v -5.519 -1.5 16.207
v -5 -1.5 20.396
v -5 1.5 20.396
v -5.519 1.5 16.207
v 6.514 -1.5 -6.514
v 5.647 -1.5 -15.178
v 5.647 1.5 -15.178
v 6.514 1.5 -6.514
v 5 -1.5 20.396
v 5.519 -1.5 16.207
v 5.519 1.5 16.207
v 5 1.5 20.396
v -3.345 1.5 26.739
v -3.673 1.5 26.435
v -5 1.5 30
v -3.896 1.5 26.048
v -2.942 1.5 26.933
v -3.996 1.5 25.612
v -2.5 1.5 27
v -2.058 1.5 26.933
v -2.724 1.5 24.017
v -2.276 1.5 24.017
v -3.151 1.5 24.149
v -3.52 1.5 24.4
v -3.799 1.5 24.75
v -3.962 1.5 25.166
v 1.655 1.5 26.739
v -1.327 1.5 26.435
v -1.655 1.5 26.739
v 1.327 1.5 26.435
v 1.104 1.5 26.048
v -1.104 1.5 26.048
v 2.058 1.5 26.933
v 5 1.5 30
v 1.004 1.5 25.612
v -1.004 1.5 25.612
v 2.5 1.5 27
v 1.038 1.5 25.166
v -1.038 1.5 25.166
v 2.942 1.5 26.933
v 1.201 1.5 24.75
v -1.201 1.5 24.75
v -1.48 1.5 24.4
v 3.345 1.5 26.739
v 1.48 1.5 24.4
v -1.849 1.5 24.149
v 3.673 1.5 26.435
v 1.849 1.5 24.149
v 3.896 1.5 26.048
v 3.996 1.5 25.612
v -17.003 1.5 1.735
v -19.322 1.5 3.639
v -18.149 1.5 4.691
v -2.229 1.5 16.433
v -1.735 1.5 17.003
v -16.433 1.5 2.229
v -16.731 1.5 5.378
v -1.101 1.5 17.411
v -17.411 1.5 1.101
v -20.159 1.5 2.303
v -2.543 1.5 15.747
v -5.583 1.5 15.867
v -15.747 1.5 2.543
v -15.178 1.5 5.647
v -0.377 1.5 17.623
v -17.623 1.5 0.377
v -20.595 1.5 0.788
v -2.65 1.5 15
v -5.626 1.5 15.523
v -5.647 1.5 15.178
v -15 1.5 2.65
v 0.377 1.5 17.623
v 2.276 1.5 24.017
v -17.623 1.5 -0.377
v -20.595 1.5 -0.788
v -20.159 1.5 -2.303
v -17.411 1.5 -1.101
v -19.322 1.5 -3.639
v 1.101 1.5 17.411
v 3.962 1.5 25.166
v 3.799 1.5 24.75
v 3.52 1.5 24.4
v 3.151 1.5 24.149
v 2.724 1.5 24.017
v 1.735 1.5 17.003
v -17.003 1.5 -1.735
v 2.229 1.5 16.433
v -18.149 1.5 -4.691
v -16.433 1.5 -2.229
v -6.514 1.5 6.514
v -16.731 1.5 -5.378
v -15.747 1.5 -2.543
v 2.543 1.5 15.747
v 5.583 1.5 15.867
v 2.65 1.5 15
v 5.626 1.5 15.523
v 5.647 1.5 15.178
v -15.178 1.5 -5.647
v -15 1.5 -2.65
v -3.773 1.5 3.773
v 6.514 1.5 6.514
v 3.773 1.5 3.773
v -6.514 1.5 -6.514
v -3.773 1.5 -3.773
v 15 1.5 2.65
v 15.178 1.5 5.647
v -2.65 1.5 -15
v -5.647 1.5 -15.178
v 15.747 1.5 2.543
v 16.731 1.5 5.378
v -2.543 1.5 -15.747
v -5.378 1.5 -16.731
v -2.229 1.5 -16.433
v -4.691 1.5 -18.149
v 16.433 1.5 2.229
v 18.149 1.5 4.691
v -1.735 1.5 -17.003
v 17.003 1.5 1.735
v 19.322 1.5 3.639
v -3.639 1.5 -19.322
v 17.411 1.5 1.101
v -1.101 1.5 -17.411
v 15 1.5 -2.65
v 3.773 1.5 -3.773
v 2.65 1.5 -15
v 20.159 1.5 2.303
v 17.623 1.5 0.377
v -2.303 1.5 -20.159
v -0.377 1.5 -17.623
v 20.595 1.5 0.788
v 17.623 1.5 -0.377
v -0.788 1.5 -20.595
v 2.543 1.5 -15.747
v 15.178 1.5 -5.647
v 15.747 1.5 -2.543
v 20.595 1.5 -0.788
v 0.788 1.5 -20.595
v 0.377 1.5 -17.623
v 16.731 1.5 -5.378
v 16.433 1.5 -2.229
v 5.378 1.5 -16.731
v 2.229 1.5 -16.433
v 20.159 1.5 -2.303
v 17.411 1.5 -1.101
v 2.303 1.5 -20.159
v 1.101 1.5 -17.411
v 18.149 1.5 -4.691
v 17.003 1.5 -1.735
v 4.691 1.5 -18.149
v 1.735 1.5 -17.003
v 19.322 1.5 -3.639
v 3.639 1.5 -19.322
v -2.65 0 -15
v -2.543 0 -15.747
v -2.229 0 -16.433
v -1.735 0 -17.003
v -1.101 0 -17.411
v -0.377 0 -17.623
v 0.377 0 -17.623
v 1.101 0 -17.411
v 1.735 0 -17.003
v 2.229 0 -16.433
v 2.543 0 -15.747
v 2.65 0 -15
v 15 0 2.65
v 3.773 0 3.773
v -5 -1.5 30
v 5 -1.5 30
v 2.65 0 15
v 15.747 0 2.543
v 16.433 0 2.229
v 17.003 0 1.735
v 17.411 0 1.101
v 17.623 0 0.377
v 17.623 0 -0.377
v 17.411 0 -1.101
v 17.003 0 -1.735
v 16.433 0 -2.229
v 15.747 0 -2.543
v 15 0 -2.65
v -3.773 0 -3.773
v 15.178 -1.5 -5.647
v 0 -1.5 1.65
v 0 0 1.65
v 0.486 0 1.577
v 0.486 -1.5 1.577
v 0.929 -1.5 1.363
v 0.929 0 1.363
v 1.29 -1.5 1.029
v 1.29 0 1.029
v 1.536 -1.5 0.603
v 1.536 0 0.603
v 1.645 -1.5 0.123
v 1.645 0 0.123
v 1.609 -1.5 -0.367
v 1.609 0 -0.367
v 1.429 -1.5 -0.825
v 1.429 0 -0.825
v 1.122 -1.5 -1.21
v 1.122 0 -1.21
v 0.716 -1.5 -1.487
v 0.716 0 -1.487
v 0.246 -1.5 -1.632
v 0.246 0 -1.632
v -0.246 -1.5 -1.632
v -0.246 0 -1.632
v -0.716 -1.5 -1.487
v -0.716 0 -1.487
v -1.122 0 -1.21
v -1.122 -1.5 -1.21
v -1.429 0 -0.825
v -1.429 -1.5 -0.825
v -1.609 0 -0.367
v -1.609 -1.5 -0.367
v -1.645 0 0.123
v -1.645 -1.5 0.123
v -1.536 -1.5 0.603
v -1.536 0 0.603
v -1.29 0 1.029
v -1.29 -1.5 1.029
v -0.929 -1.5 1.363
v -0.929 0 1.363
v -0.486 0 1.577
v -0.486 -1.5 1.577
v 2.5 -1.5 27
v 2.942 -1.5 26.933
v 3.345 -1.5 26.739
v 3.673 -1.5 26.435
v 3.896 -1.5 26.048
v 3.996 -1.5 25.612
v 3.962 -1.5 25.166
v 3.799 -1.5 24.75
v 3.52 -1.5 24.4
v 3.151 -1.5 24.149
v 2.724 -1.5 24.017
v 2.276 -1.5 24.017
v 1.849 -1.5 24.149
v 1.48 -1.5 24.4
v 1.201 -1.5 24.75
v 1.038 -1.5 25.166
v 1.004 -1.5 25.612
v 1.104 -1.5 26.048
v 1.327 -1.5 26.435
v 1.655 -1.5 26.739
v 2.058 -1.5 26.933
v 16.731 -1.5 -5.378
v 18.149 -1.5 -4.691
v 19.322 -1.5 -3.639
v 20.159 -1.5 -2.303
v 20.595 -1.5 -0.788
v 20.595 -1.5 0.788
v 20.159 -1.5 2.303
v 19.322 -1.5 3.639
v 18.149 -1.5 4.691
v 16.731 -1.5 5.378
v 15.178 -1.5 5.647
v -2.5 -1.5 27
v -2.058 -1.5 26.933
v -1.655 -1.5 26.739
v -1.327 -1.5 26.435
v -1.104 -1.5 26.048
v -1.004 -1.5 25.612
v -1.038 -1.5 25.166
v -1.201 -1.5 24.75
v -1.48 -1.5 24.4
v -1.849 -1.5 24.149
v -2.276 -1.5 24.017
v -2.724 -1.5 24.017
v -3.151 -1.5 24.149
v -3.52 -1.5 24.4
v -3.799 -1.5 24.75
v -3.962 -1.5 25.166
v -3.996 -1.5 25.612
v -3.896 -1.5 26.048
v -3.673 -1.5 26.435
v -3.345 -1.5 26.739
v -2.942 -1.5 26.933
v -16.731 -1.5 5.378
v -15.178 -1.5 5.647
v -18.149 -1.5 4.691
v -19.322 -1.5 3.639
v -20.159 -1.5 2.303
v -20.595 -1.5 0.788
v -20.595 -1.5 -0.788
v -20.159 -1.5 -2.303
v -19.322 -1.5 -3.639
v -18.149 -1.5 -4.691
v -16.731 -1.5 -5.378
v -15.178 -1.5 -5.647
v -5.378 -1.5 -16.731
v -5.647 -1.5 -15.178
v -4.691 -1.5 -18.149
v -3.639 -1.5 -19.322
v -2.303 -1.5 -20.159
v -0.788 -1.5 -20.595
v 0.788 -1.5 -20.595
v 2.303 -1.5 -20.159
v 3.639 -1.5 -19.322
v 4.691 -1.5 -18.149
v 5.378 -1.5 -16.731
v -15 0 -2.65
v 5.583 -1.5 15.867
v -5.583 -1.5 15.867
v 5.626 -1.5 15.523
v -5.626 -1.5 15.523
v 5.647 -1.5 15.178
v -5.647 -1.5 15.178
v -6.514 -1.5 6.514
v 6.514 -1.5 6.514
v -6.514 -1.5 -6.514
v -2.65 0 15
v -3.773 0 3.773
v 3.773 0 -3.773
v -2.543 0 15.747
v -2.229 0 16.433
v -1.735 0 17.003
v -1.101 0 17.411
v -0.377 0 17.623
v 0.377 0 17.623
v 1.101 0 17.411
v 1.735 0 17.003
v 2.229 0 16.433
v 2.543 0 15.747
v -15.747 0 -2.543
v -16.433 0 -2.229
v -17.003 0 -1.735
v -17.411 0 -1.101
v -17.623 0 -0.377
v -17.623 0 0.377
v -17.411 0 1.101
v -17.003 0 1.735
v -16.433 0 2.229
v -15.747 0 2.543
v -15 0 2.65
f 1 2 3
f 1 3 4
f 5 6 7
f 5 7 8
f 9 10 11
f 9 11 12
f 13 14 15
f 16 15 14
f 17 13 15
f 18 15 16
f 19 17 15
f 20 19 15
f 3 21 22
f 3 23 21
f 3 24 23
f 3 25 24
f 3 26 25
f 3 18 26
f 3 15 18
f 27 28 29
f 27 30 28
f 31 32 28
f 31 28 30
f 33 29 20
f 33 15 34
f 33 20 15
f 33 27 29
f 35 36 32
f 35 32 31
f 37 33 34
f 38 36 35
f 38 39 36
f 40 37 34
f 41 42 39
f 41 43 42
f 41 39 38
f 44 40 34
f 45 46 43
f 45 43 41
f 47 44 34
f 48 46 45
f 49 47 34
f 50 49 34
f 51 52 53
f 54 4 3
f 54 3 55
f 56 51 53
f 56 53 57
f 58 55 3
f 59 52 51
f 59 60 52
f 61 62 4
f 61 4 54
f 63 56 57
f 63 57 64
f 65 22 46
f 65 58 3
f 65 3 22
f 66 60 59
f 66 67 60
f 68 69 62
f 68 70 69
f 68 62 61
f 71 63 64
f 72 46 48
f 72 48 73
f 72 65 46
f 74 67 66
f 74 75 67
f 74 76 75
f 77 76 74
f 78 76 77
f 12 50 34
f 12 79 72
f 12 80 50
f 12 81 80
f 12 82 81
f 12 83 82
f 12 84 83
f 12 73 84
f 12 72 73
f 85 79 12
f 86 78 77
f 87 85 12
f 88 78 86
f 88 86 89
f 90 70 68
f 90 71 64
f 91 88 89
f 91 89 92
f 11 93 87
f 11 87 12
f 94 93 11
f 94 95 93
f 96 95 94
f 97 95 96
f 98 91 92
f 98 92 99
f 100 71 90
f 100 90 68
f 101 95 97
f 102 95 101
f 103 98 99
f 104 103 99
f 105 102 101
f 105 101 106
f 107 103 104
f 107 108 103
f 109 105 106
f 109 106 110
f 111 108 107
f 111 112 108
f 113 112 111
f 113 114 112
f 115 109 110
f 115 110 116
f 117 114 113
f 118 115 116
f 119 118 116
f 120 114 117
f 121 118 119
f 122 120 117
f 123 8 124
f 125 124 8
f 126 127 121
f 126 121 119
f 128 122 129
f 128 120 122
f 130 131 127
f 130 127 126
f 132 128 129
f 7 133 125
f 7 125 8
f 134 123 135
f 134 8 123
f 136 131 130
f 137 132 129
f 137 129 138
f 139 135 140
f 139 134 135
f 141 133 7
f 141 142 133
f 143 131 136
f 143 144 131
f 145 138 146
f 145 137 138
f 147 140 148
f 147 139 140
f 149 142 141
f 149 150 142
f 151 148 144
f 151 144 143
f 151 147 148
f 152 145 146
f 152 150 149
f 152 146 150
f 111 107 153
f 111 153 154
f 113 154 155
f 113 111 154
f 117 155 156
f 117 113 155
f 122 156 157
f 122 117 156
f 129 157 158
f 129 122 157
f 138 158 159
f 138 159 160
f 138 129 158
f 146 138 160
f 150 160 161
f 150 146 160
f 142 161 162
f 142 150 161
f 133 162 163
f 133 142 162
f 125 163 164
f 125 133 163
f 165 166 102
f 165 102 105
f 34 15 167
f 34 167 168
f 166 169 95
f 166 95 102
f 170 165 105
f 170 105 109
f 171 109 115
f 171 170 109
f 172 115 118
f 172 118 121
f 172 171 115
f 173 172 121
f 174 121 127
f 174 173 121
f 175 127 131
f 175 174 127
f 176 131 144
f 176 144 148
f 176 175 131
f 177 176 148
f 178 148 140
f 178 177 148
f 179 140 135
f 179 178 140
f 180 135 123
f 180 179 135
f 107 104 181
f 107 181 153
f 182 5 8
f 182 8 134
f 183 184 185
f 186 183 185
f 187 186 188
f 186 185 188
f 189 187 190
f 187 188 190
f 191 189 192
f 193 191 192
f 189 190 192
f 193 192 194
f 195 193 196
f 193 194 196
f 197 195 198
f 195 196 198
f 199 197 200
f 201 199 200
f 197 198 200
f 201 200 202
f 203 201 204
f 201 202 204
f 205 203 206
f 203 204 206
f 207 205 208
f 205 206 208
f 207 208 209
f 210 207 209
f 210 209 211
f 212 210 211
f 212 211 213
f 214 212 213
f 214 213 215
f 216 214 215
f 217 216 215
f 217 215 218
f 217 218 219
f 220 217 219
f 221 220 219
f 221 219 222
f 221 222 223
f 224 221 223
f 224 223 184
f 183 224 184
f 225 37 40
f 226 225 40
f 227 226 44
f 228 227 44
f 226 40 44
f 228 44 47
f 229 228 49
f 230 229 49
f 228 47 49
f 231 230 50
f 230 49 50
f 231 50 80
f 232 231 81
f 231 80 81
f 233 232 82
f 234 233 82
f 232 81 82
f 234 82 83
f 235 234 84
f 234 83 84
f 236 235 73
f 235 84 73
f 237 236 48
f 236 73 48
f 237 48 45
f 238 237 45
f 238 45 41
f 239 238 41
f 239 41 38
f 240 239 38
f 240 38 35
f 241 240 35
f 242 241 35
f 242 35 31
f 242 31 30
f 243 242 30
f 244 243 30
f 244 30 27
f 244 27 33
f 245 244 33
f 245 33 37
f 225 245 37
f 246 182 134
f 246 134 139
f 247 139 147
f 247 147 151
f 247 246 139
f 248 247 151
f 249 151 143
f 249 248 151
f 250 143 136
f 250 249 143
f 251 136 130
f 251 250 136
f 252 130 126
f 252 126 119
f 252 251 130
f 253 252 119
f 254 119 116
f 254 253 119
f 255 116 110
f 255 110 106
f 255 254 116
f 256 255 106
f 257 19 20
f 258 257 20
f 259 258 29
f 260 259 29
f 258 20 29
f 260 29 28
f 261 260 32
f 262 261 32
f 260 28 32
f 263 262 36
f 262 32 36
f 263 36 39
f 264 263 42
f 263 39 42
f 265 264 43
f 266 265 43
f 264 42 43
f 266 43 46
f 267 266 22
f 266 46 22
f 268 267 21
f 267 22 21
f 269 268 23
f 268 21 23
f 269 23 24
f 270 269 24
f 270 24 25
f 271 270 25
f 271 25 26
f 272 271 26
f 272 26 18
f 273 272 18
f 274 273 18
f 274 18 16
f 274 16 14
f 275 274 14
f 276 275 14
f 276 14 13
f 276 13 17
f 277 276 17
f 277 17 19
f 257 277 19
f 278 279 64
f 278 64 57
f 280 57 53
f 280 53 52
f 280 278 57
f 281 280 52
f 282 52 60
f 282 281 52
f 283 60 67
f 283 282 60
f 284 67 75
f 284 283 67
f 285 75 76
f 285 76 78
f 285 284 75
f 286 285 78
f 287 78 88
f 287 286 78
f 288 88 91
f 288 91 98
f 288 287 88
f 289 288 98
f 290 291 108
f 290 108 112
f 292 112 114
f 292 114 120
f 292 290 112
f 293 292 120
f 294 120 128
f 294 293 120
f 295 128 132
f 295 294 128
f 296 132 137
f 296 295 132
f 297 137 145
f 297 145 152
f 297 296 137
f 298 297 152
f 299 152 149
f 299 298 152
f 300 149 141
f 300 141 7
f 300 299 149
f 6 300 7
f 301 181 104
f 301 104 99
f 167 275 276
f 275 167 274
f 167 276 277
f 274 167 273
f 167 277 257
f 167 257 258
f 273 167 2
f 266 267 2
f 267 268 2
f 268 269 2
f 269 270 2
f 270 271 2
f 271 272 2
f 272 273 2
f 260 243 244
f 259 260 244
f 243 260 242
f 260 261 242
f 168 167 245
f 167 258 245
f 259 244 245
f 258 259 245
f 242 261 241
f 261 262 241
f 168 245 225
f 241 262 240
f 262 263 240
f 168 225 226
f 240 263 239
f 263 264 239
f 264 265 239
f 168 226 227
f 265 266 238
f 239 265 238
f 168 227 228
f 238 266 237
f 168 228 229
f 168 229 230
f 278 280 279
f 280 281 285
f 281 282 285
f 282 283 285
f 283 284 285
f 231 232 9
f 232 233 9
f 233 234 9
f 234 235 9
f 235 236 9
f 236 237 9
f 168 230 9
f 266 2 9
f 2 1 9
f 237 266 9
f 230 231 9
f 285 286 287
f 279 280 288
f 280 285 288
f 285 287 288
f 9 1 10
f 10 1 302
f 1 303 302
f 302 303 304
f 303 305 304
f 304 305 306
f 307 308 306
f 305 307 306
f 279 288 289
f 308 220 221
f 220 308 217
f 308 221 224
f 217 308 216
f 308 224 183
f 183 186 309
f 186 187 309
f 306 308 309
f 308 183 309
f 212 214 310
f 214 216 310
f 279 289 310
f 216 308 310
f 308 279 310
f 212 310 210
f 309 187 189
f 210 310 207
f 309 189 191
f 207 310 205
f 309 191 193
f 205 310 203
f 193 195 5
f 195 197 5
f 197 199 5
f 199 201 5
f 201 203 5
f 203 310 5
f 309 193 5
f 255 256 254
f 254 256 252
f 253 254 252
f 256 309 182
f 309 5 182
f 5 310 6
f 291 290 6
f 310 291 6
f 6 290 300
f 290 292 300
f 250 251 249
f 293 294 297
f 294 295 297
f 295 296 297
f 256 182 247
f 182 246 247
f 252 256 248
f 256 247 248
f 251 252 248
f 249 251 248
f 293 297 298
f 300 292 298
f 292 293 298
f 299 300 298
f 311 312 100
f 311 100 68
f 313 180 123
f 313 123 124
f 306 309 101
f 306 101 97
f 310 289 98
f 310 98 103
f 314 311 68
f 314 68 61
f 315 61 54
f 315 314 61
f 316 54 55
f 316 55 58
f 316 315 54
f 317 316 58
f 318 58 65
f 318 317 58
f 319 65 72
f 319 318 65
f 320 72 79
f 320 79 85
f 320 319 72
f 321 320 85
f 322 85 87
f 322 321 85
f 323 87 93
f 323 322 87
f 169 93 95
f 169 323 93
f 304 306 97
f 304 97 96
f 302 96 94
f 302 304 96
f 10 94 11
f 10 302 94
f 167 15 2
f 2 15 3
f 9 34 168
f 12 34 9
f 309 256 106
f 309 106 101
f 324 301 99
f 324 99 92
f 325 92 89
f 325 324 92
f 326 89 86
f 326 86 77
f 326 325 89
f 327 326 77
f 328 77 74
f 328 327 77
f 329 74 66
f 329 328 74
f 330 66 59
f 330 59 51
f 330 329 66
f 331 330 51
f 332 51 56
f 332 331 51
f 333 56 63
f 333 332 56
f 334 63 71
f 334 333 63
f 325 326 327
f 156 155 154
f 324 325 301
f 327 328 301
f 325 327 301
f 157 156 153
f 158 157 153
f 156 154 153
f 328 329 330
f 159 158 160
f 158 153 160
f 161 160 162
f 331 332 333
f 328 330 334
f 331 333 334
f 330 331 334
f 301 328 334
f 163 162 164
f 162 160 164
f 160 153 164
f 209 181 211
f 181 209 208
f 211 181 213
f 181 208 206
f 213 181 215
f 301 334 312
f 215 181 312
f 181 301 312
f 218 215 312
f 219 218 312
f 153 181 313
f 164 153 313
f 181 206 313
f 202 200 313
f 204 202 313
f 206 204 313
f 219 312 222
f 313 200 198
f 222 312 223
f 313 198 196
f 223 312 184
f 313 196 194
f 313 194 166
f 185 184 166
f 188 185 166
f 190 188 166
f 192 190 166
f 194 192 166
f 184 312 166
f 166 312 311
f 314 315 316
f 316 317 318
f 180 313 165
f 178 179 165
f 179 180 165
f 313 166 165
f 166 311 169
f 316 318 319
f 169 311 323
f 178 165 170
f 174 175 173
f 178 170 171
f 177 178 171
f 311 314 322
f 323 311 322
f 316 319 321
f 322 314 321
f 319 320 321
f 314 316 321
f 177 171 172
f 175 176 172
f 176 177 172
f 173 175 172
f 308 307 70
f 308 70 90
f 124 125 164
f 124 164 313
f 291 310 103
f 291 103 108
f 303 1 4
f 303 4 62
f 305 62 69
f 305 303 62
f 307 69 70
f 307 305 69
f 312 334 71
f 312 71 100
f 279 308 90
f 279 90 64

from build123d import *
from build123d.topology import SkipClean

# Parameters (mm, degrees)
SKETCH1_R               = 21
BOSS_EXTRUDE1_DEPTH     = 1.5
SKETCH2_R               = 2.65
CUT_EXTRUDE1_DEPTH      = 1.5
SKETCH5_W               = 10
SKETCH5_H               = 30
BOSS_EXTRUDE2_DEPTH     = 1.5
CIRPATTERN1_DEPTH       = 1.5
CUT_EXTRUDE4_REACH      = 38.65
SKETCH4_R               = 1.65
CUT_EXTRUDE5_REACH      = 38.742
SKETCH6_R               = 1.5
CUT_EXTRUDE6_DEPTH      = 37.650375169
CUT_EXTRUDE6_DEPTH_BACK = 37.650375169


# Read off the part's stored shape, not the designer's step: CirPattern1
with BuildPart() as part:
    # Sketch1 → Boss-Extrude1 (new, symmetric)
    with BuildSketch(Plane(origin=(0, 0, 0), x_dir=(1, 0, 0), z_dir=(0, 1, 0))):
        with Locations(Location((0, 0, 0), (0, 0, 270))):
            Circle(SKETCH1_R)
    extrude(amount=BOSS_EXTRUDE1_DEPTH, both=True)

    # Sketch2 → Cut-Extrude1 (cut)
    with BuildSketch(Plane(origin=(0, 1.5, 0), x_dir=(1, 0, 0), z_dir=(0, 1, 0))):
        with Locations((0, -15)):
            Circle(SKETCH2_R)
        with BuildLine():
            ThreePointArc((-2.65, -15), (0, -12.35), (2.65, -15))
            Line((2.65, -15), (4.067821782, -0.821782178))
            ThreePointArc((4.067821782, -0.821782178), (0, -4.15), (-4.067821782, -0.821782178))
            Line((-4.067821782, -0.821782178), (-2.65, -15))
        make_face()
        with BuildLine():
            ThreePointArc((-4.067821782, -0.821782178), (0, -4.15), (4.067821782, -0.821782178))
            Line((4.067821782, -0.821782178), (4.15, 0))
            ThreePointArc((4.15, 0), (0, 4.15), (-4.15, 0))
            Line((-4.15, 0), (-4.067821782, -0.821782178))
        make_face()
    cut_extrude1 = extrude(amount=-CUT_EXTRUDE1_DEPTH, mode=Mode.SUBTRACT)

    # Sketch5 → Boss-Extrude2 (add, symmetric)
    with BuildSketch(Plane(origin=(0, 0, 0), x_dir=(1, 0, 0), z_dir=(0, 1, 0))):
        with Locations((0, -15)):
            Rectangle(SKETCH5_W, SKETCH5_H)
    extrude(amount=BOSS_EXTRUDE2_DEPTH, both=True)

    # Mirror1: Cut-Extrude1 across plane
    with SkipClean():  # the faces are left unmerged after this step: merging them gives an invalid solid
        add(cut_extrude1.mirror(Plane.XY), mode=Mode.SUBTRACT)

    # CirPattern1 outline → CirPattern1 (cut)
    with BuildSketch(Plane(origin=(0, 0, 0), x_dir=(1, 0, 0), z_dir=(0, 1, 0))):
        with BuildLine():
            Line((3.772727273, -3.772727273), (15, -2.65))
            ThreePointArc((15, -2.65), (17.65, 0), (15, 2.65))
            Line((15, 2.65), (3.772727273, 3.772727273))
            Line((3.772727273, 3.772727273), (4.067821782, 0.821782178))
            ThreePointArc((4.067821782, 0.821782178), (0, -4.15), (-4.067821782, 0.821782178))
            Line((-4.067821782, 0.821782178), (-3.772727273, 3.772727273))
            Line((-3.772727273, 3.772727273), (-15, 2.65))
            ThreePointArc((-15, 2.65), (-17.65, 0), (-15, -2.65))
            Line((-15, -2.65), (-3.772727273, -3.772727273))
            Line((-3.772727273, -3.772727273), (-2.65, -15))
            ThreePointArc((-2.65, -15), (0, -17.65), (2.65, -15))
            Line((2.65, -15), (3.772727273, -3.772727273))
        make_face()
    extrude(amount=CIRPATTERN1_DEPTH, mode=Mode.SUBTRACT)

    # Sketch4 → Cut-Extrude4 (cut, up to next)
    with BuildSketch(Plane(origin=(0, 0, 0), x_dir=(1, 0, 0), z_dir=(0, 1, 0)), mode=Mode.PRIVATE) as cut_extrude4_sk1:
        with Locations(Location((0, 0, 0), (0, 0, 270))):
            Circle(SKETCH4_R)
    cut_extrude4_tool1 = extrude(cut_extrude4_sk1.sketch, amount=-CUT_EXTRUDE4_REACH, mode=Mode.PRIVATE) & part.part
    add(cut_extrude4_tool1.solids().sort_by_distance((0, 0, 0))[0], mode=Mode.SUBTRACT)

    # Sketch6 → Cut-Extrude5 (cut, up to next)
    with BuildSketch(Plane(origin=(0, 1.5, 0), x_dir=(1, 0, 0), z_dir=(0, 1, 0)), mode=Mode.PRIVATE) as cut_extrude5_sk1:
        with Locations(Location((2.5, -25.5, 0), (0, 0, 270))):
            Circle(SKETCH6_R)
    cut_extrude5_tool1 = extrude(cut_extrude5_sk1.sketch, amount=-CUT_EXTRUDE5_REACH, mode=Mode.PRIVATE) & part.part
    # Sketch6 → Cut-Extrude5 (cut, up to next)
    with BuildSketch(Plane(origin=(0, 1.5, 0), x_dir=(1, 0, 0), z_dir=(0, 1, 0)), mode=Mode.PRIVATE) as cut_extrude5_sk2:
        with Locations(Location((-2.5, -25.5, 0), (0, 0, 270))):
            Circle(SKETCH6_R)
    cut_extrude5_tool2 = extrude(cut_extrude5_sk2.sketch, amount=-CUT_EXTRUDE5_REACH, mode=Mode.PRIVATE) & part.part
    add(cut_extrude5_tool1.solids().sort_by_distance((2.5, 1.5, 25.5))[0], mode=Mode.SUBTRACT)
    add(cut_extrude5_tool2.solids().sort_by_distance((-2.5, 1.5, 25.5))[0], mode=Mode.SUBTRACT)

    # Sketch7 → Cut-Extrude6 (cut, two sides: drawn at the far end of the back side and taken through both)
    with BuildSketch(Plane(origin=(0, 0, 0), x_dir=(1, 0, 0), z_dir=(0, 1, 0)).offset(-CUT_EXTRUDE6_DEPTH_BACK)):
        with BuildLine():
            ThreePointArc((5, -20.396078054), (0, 21), (-5, -20.396078054))
            Line((-5, -20.396078054), (-5.519486194, -16.207382355))
            ThreePointArc((-5.519486194, -16.207382355), (-5.607043009, -15.695391034), (-5.647210443, -15.177522436))
            Line((-5.647210443, -15.177522436), (-6.513602442, -6.513602442))
            Line((-6.513602442, -6.513602442), (-15.177522436, -5.647210443))
            ThreePointArc((-15.177522436, -5.647210443), (-20.65, 0), (-15.177522436, 5.647210443))
            Line((-15.177522436, 5.647210443), (-6.513602442, 6.513602442))
            Line((-6.513602442, 6.513602442), (-5.647210443, 15.177522436))
            ThreePointArc((-5.647210443, 15.177522436), (0, 20.65), (5.647210443, 15.177522436))
            Line((5.647210443, 15.177522436), (6.513602442, 6.513602442))
            Line((6.513602442, 6.513602442), (15.177522436, 5.647210443))
            ThreePointArc((15.177522436, 5.647210443), (20.65, 0), (15.177522436, -5.647210443))
            Line((15.177522436, -5.647210443), (6.513602442, -6.513602442))
            Line((6.513602442, -6.513602442), (5.647210443, -15.177522436))
            ThreePointArc((5.647210443, -15.177522436), (5.607043009, -15.695391034), (5.519486194, -16.207382355))
            Line((5.519486194, -16.207382355), (5, -20.396078054))
        make_face()
    extrude(amount=CUT_EXTRUDE6_DEPTH + CUT_EXTRUDE6_DEPTH_BACK, mode=Mode.SUBTRACT)


solid = part.part
